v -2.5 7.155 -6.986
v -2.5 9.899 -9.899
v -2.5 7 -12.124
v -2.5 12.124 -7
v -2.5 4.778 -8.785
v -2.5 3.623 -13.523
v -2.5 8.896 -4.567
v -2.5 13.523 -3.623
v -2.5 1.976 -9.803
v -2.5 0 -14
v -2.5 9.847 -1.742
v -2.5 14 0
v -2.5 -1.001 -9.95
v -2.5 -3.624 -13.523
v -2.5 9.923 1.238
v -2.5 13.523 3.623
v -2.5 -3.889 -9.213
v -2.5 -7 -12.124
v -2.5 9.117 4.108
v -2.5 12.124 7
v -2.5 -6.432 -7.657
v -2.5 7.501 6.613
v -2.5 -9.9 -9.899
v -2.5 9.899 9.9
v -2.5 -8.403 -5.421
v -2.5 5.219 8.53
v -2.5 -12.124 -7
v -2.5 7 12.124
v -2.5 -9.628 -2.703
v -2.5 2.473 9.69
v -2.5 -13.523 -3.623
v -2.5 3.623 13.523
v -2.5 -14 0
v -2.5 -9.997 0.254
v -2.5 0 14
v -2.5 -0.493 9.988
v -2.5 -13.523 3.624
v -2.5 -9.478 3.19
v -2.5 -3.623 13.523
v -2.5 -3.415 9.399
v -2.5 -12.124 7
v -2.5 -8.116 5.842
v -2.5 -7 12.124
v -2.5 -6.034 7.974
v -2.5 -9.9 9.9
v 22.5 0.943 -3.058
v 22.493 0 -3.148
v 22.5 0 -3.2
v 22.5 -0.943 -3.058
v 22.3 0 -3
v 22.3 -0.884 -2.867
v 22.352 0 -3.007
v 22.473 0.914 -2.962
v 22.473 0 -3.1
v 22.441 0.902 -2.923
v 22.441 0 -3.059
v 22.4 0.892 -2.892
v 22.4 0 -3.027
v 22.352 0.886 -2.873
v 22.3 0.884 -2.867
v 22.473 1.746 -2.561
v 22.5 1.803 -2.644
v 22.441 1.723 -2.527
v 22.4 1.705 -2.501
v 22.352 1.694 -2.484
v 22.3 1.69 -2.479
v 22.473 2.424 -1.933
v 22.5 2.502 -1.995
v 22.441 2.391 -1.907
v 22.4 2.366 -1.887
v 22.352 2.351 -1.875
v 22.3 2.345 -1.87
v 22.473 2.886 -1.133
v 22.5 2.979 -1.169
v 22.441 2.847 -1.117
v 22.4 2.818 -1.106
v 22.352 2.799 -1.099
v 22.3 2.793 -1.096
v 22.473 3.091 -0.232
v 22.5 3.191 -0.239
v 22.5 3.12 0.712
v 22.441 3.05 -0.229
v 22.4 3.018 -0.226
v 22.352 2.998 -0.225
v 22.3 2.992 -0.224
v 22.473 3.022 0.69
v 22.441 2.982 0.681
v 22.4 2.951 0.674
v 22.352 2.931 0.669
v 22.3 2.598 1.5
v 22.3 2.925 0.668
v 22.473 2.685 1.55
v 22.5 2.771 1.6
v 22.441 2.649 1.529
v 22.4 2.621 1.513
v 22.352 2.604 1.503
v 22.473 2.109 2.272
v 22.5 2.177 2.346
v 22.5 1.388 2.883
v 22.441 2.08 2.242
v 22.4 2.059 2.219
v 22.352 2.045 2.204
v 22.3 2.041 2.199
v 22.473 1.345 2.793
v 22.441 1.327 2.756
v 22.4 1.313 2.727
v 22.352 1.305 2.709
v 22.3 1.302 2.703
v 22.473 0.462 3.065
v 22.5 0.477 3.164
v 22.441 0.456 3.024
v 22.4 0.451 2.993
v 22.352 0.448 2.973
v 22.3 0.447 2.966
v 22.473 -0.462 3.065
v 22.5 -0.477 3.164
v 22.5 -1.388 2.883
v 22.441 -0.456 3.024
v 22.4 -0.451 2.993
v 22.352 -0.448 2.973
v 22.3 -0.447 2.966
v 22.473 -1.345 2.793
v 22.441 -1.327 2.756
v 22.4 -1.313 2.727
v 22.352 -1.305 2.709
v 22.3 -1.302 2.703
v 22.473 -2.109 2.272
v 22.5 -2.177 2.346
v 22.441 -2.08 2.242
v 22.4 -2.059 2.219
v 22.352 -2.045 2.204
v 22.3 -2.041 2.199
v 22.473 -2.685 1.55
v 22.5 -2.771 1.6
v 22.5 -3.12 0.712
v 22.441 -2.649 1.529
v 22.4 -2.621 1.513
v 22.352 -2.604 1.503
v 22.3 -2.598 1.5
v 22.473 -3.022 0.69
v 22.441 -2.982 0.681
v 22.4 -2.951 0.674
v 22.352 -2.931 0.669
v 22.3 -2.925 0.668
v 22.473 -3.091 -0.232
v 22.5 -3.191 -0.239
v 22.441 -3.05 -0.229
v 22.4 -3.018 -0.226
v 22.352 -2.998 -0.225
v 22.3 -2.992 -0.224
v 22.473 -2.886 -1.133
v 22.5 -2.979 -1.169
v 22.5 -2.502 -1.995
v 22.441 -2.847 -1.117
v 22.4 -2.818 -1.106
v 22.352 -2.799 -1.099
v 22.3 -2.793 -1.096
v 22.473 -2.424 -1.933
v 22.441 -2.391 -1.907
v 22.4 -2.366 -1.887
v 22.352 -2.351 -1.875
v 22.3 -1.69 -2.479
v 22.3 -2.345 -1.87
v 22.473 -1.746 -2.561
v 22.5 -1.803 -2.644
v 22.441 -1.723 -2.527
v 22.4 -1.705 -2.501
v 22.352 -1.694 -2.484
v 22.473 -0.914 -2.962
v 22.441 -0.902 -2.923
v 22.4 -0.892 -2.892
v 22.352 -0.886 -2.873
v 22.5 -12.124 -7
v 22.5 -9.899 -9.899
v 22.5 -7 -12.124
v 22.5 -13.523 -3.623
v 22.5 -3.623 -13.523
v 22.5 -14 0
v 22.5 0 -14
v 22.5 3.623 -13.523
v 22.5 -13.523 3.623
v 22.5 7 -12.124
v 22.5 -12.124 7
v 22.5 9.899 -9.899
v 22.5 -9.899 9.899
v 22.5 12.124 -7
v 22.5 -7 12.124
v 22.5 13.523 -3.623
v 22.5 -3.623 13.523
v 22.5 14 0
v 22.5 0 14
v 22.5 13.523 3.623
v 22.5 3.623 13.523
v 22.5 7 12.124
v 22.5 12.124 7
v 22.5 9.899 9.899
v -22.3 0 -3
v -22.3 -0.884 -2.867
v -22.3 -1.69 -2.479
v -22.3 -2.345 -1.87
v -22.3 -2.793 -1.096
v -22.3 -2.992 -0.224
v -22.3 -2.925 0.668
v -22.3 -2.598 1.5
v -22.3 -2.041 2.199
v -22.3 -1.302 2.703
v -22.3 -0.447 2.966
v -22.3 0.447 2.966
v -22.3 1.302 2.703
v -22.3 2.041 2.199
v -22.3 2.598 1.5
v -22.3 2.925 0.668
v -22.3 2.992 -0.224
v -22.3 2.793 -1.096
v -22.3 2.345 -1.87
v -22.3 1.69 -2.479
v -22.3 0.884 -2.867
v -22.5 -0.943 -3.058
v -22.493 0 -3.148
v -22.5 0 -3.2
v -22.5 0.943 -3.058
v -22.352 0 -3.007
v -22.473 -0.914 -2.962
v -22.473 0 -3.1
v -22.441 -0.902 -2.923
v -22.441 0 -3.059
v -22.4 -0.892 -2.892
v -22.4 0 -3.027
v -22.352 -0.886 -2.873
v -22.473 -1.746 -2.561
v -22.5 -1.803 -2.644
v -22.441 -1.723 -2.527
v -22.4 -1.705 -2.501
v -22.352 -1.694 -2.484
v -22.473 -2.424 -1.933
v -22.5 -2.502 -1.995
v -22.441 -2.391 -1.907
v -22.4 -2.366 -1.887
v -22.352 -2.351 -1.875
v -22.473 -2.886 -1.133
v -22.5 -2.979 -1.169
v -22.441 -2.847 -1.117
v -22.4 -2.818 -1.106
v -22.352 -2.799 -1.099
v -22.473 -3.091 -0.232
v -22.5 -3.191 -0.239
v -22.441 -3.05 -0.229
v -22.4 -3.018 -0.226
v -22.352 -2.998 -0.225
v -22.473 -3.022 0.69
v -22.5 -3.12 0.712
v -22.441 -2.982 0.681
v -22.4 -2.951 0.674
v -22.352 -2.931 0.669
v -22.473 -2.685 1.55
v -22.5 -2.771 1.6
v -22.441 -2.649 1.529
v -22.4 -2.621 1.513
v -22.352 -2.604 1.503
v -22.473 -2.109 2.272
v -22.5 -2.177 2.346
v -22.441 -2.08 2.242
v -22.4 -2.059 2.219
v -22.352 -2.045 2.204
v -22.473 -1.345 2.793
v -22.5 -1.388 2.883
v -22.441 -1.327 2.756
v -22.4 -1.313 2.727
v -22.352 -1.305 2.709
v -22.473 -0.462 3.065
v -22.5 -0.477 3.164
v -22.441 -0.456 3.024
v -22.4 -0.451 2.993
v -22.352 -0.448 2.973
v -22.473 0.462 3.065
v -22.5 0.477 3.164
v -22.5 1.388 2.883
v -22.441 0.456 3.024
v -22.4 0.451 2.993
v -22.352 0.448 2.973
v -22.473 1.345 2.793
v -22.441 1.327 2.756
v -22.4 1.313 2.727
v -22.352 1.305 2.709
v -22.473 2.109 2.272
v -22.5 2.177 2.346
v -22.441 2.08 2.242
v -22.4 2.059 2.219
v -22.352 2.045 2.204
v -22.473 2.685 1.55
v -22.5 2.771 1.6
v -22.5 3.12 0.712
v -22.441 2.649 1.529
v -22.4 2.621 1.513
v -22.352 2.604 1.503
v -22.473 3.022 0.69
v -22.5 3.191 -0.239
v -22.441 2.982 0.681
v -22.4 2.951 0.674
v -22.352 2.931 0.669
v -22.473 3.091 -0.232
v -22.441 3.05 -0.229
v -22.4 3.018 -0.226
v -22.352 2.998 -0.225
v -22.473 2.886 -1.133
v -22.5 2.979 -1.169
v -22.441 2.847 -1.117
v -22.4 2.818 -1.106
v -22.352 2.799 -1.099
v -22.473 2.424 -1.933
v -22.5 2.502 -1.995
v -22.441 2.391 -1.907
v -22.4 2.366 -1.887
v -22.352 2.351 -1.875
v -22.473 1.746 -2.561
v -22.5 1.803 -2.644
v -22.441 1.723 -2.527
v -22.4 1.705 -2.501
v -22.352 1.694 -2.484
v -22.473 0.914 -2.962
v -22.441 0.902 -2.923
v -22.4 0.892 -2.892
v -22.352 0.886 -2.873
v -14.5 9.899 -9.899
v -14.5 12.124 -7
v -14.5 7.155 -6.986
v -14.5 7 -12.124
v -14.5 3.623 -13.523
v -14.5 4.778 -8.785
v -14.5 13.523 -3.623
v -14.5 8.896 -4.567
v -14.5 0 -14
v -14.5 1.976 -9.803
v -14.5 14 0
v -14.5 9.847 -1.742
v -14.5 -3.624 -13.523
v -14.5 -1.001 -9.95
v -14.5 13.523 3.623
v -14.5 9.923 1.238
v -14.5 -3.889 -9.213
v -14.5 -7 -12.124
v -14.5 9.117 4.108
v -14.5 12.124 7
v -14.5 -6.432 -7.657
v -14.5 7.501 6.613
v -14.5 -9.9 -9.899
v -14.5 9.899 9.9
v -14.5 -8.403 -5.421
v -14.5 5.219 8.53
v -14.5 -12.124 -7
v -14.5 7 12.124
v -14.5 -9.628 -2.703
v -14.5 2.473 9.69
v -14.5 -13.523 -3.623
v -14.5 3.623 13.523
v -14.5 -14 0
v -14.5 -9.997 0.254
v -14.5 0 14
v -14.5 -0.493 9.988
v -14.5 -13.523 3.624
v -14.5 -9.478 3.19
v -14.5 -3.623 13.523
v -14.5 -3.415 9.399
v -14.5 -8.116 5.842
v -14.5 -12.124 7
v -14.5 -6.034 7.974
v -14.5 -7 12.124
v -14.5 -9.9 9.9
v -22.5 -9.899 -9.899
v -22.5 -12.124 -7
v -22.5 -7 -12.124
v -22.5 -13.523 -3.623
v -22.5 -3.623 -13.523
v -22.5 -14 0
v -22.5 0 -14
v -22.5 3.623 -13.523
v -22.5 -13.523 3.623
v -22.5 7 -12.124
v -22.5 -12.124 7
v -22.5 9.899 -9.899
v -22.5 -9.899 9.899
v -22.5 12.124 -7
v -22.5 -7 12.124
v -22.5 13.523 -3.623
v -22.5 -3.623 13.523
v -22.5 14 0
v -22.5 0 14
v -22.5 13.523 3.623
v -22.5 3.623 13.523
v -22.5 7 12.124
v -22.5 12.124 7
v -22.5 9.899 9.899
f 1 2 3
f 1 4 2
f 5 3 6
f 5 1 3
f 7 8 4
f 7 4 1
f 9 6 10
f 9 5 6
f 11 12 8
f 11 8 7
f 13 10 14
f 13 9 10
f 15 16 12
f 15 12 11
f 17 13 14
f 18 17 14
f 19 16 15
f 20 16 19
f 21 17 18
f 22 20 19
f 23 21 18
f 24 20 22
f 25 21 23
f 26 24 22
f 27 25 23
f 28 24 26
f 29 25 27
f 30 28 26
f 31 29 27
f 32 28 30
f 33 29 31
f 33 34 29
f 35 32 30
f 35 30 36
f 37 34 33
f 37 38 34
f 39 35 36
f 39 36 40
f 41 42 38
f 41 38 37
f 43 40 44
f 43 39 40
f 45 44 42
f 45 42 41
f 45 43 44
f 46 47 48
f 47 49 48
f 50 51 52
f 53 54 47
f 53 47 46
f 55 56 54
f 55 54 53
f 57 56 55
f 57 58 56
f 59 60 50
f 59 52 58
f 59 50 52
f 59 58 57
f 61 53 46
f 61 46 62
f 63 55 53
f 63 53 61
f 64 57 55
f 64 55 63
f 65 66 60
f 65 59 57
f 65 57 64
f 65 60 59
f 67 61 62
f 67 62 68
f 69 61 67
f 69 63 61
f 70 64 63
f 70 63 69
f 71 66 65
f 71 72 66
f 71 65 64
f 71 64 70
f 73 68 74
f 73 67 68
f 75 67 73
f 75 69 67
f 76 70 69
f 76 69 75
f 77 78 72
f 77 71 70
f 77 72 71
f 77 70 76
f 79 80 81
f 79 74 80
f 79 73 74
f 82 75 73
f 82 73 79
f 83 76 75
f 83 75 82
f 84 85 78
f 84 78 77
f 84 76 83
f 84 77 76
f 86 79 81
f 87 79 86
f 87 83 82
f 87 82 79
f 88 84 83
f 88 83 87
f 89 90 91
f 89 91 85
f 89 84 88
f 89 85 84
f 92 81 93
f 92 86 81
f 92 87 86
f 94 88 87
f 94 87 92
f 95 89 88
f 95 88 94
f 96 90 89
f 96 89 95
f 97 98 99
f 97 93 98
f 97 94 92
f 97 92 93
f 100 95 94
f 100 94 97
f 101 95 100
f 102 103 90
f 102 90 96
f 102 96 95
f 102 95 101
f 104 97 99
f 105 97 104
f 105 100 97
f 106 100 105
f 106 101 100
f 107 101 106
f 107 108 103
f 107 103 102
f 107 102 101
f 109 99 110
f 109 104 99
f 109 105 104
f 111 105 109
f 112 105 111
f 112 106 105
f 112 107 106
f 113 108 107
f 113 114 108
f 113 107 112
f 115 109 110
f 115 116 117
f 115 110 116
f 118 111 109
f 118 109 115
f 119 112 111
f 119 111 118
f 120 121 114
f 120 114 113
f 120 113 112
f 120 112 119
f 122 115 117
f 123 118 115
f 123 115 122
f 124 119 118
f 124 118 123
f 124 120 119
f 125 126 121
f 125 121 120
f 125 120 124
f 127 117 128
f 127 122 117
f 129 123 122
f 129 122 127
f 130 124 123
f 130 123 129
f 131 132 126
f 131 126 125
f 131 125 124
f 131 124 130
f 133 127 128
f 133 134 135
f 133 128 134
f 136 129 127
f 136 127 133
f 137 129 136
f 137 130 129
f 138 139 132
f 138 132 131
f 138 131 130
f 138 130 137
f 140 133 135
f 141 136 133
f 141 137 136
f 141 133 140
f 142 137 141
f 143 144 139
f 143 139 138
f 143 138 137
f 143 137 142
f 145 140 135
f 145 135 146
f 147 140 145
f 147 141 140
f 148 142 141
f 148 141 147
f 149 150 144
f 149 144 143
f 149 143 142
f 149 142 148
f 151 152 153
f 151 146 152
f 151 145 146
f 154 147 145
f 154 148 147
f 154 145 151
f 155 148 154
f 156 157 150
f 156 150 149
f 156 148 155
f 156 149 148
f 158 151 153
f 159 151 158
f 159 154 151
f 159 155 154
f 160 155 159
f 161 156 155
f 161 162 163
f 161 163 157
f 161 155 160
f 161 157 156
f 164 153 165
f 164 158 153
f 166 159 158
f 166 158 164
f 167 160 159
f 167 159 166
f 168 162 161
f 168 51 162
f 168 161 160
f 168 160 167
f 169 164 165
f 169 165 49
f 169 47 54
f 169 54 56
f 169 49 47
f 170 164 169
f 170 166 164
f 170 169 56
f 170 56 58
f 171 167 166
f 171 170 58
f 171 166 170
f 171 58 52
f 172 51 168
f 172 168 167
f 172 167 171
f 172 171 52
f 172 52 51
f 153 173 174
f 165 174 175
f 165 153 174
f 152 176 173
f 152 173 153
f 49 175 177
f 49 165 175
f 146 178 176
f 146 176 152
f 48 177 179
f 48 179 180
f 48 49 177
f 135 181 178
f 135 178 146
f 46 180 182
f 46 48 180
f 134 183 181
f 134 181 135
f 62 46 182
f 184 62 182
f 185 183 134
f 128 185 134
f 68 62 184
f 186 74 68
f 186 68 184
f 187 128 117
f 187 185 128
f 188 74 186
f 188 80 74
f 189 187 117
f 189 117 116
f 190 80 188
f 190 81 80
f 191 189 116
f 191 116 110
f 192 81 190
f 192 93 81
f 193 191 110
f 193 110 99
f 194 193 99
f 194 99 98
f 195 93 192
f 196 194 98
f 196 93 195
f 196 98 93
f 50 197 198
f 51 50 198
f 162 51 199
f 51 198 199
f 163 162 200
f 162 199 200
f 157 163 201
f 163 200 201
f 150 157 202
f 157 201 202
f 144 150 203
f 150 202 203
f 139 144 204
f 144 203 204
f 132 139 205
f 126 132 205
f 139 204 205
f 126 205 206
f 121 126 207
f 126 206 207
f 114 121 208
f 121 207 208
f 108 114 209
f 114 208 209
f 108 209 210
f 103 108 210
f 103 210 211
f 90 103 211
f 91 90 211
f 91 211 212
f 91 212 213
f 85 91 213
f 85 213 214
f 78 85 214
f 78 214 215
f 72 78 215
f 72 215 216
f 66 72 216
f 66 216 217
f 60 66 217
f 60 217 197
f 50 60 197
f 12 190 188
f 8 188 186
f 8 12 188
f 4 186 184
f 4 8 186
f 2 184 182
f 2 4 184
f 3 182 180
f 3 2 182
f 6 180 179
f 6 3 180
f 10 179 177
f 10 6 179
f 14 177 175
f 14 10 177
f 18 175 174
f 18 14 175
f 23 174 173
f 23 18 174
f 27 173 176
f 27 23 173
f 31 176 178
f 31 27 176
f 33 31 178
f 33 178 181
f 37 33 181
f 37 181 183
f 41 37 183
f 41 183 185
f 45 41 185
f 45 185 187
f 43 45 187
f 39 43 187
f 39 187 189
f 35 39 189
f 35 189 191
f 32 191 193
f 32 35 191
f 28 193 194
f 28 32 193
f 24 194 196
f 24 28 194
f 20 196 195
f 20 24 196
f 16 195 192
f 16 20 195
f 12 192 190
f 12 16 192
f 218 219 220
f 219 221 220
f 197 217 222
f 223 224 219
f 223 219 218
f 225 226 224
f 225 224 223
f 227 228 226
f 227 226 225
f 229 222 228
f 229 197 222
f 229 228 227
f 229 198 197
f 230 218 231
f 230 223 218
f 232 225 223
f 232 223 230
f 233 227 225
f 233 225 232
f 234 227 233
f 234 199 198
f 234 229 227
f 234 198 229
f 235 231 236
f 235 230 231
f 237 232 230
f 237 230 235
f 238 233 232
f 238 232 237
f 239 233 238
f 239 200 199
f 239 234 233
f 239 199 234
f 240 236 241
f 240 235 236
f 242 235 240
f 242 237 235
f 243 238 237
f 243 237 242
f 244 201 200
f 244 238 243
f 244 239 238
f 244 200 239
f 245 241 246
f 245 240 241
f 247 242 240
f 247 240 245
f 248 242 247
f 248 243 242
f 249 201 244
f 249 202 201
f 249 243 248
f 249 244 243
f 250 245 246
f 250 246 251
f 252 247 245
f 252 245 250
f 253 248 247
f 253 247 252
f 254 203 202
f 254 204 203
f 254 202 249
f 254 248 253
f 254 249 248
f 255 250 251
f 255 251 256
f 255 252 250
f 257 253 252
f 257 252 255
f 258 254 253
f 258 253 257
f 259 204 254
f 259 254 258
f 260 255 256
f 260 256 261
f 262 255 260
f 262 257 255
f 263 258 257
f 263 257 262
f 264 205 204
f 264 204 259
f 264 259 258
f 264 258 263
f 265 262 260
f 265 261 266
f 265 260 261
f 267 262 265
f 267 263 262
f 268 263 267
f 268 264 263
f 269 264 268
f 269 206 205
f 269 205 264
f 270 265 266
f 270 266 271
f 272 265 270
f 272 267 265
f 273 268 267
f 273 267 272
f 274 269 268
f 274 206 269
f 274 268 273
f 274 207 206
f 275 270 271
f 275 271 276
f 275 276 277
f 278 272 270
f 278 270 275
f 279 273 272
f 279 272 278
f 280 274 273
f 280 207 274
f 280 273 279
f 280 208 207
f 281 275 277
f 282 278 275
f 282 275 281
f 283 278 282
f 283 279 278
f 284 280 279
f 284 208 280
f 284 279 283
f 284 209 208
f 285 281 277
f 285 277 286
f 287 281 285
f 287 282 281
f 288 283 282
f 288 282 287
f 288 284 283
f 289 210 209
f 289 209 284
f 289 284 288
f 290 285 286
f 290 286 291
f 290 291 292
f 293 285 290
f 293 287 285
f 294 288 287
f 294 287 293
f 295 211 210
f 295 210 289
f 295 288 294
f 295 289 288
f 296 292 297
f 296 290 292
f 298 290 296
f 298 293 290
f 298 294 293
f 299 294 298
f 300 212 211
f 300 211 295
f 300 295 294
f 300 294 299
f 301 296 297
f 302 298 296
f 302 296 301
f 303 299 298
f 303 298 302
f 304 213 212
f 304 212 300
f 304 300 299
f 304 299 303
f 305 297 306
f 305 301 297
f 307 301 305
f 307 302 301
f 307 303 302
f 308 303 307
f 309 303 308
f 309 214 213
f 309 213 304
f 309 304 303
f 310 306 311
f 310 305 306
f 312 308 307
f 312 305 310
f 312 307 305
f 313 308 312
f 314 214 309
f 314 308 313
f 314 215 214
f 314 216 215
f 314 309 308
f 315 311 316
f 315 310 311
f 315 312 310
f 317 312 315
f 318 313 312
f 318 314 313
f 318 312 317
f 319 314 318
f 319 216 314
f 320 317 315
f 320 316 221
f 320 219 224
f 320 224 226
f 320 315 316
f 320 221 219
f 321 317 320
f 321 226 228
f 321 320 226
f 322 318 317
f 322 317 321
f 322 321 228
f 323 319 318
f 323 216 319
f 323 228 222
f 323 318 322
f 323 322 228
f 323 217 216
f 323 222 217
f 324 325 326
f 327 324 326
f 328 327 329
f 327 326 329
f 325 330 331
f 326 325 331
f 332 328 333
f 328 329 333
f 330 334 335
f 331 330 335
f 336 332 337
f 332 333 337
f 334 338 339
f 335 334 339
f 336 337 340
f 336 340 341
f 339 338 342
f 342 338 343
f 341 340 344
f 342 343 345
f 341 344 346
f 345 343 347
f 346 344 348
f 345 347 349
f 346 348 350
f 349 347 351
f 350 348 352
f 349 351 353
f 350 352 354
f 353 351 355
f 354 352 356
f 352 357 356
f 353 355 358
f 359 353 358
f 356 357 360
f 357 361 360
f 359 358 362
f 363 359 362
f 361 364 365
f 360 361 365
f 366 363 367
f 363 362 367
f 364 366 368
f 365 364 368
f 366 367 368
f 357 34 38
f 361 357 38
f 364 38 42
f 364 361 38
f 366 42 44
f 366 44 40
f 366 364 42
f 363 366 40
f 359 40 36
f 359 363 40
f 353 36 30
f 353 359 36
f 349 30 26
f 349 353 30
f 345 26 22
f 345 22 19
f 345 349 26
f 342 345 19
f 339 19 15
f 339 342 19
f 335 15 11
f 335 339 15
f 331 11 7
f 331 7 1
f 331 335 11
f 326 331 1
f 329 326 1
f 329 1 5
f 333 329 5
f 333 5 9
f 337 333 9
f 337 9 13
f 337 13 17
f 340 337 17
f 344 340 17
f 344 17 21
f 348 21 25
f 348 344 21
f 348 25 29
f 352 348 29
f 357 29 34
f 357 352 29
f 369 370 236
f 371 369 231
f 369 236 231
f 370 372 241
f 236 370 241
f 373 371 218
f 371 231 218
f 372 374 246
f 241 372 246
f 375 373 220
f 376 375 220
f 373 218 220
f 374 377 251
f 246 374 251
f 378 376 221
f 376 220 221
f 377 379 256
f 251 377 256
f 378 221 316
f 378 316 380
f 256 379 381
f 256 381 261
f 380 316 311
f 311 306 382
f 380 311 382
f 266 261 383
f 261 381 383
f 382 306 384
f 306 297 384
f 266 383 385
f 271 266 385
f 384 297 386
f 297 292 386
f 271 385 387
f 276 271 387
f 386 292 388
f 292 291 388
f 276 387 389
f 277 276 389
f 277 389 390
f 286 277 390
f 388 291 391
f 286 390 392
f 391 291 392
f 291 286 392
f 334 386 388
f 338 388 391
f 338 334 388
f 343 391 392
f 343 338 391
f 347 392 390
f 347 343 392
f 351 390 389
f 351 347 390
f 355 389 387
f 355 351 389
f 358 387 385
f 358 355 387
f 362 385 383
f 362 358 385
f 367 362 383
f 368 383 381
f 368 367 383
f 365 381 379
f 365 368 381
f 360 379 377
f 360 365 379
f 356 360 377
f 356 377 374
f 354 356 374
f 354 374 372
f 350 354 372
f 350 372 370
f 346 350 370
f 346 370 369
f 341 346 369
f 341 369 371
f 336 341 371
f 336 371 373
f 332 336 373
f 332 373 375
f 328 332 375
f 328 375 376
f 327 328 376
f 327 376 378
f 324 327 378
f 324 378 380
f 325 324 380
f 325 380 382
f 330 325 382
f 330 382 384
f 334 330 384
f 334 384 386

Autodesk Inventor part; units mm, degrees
ref_plane "YZ Plane" through (0, 0, 0) normal (1, 0, 0) x (0, 1, 0)
ref_plane "XZ Plane" through (0, 0, 0) normal (0, 1, 0) x (-1, 0, 0)
ref_plane "XY Plane" through (0, 0, 0) normal (0, 0, 1) x (1, 0, 0)
sketch "Эскиз1" plane through (0, 0, 0) normal (1, 0, 0) x (0, 1, 0)
  circle A0 centre (0, 0) radius 14
  dimension "d0" = 28
extrude "Выдавливание1" add sketch "Эскиз1" along normal mid plane 45
sketch "Эскиз2" plane through (22.5, 0, 0) normal (1, 0, 0) x (0, 0, -1)
  point P0 (0, 0)
  point P1 (0, 0)
hole "Отверстие1" at (22.5, 0, 0) direction (-1, 0, 0) diameter 6 depth 60
fillet "Сопряжение1" radius 0.2 2 edges at (22.5, 0, 3) (-22.5, 0, 3)
ref_plane "РабПлоскость2" through (-14.5, 2.1629, 84.9725) normal (-1, 0, 0) x (0, -0.9996762, 0.0254464)
sketch "Эскиз4" plane through (-14.5, 2.1629, 84.9725) normal (-1, 0, 0) x (0, -0.9996762, 0.0254464)
  circle A0 centre (0, -85) radius 10
  circle A1 centre (0, -85) radius 3.2 projected
  circle A2 centre (0, -85) radius 14
  dimension "d14" = 20
extrude "Выдавливание3" cut sketch "Эскиз4" against normal blind 12 contours A2
properties part number "Вал конвейера"
